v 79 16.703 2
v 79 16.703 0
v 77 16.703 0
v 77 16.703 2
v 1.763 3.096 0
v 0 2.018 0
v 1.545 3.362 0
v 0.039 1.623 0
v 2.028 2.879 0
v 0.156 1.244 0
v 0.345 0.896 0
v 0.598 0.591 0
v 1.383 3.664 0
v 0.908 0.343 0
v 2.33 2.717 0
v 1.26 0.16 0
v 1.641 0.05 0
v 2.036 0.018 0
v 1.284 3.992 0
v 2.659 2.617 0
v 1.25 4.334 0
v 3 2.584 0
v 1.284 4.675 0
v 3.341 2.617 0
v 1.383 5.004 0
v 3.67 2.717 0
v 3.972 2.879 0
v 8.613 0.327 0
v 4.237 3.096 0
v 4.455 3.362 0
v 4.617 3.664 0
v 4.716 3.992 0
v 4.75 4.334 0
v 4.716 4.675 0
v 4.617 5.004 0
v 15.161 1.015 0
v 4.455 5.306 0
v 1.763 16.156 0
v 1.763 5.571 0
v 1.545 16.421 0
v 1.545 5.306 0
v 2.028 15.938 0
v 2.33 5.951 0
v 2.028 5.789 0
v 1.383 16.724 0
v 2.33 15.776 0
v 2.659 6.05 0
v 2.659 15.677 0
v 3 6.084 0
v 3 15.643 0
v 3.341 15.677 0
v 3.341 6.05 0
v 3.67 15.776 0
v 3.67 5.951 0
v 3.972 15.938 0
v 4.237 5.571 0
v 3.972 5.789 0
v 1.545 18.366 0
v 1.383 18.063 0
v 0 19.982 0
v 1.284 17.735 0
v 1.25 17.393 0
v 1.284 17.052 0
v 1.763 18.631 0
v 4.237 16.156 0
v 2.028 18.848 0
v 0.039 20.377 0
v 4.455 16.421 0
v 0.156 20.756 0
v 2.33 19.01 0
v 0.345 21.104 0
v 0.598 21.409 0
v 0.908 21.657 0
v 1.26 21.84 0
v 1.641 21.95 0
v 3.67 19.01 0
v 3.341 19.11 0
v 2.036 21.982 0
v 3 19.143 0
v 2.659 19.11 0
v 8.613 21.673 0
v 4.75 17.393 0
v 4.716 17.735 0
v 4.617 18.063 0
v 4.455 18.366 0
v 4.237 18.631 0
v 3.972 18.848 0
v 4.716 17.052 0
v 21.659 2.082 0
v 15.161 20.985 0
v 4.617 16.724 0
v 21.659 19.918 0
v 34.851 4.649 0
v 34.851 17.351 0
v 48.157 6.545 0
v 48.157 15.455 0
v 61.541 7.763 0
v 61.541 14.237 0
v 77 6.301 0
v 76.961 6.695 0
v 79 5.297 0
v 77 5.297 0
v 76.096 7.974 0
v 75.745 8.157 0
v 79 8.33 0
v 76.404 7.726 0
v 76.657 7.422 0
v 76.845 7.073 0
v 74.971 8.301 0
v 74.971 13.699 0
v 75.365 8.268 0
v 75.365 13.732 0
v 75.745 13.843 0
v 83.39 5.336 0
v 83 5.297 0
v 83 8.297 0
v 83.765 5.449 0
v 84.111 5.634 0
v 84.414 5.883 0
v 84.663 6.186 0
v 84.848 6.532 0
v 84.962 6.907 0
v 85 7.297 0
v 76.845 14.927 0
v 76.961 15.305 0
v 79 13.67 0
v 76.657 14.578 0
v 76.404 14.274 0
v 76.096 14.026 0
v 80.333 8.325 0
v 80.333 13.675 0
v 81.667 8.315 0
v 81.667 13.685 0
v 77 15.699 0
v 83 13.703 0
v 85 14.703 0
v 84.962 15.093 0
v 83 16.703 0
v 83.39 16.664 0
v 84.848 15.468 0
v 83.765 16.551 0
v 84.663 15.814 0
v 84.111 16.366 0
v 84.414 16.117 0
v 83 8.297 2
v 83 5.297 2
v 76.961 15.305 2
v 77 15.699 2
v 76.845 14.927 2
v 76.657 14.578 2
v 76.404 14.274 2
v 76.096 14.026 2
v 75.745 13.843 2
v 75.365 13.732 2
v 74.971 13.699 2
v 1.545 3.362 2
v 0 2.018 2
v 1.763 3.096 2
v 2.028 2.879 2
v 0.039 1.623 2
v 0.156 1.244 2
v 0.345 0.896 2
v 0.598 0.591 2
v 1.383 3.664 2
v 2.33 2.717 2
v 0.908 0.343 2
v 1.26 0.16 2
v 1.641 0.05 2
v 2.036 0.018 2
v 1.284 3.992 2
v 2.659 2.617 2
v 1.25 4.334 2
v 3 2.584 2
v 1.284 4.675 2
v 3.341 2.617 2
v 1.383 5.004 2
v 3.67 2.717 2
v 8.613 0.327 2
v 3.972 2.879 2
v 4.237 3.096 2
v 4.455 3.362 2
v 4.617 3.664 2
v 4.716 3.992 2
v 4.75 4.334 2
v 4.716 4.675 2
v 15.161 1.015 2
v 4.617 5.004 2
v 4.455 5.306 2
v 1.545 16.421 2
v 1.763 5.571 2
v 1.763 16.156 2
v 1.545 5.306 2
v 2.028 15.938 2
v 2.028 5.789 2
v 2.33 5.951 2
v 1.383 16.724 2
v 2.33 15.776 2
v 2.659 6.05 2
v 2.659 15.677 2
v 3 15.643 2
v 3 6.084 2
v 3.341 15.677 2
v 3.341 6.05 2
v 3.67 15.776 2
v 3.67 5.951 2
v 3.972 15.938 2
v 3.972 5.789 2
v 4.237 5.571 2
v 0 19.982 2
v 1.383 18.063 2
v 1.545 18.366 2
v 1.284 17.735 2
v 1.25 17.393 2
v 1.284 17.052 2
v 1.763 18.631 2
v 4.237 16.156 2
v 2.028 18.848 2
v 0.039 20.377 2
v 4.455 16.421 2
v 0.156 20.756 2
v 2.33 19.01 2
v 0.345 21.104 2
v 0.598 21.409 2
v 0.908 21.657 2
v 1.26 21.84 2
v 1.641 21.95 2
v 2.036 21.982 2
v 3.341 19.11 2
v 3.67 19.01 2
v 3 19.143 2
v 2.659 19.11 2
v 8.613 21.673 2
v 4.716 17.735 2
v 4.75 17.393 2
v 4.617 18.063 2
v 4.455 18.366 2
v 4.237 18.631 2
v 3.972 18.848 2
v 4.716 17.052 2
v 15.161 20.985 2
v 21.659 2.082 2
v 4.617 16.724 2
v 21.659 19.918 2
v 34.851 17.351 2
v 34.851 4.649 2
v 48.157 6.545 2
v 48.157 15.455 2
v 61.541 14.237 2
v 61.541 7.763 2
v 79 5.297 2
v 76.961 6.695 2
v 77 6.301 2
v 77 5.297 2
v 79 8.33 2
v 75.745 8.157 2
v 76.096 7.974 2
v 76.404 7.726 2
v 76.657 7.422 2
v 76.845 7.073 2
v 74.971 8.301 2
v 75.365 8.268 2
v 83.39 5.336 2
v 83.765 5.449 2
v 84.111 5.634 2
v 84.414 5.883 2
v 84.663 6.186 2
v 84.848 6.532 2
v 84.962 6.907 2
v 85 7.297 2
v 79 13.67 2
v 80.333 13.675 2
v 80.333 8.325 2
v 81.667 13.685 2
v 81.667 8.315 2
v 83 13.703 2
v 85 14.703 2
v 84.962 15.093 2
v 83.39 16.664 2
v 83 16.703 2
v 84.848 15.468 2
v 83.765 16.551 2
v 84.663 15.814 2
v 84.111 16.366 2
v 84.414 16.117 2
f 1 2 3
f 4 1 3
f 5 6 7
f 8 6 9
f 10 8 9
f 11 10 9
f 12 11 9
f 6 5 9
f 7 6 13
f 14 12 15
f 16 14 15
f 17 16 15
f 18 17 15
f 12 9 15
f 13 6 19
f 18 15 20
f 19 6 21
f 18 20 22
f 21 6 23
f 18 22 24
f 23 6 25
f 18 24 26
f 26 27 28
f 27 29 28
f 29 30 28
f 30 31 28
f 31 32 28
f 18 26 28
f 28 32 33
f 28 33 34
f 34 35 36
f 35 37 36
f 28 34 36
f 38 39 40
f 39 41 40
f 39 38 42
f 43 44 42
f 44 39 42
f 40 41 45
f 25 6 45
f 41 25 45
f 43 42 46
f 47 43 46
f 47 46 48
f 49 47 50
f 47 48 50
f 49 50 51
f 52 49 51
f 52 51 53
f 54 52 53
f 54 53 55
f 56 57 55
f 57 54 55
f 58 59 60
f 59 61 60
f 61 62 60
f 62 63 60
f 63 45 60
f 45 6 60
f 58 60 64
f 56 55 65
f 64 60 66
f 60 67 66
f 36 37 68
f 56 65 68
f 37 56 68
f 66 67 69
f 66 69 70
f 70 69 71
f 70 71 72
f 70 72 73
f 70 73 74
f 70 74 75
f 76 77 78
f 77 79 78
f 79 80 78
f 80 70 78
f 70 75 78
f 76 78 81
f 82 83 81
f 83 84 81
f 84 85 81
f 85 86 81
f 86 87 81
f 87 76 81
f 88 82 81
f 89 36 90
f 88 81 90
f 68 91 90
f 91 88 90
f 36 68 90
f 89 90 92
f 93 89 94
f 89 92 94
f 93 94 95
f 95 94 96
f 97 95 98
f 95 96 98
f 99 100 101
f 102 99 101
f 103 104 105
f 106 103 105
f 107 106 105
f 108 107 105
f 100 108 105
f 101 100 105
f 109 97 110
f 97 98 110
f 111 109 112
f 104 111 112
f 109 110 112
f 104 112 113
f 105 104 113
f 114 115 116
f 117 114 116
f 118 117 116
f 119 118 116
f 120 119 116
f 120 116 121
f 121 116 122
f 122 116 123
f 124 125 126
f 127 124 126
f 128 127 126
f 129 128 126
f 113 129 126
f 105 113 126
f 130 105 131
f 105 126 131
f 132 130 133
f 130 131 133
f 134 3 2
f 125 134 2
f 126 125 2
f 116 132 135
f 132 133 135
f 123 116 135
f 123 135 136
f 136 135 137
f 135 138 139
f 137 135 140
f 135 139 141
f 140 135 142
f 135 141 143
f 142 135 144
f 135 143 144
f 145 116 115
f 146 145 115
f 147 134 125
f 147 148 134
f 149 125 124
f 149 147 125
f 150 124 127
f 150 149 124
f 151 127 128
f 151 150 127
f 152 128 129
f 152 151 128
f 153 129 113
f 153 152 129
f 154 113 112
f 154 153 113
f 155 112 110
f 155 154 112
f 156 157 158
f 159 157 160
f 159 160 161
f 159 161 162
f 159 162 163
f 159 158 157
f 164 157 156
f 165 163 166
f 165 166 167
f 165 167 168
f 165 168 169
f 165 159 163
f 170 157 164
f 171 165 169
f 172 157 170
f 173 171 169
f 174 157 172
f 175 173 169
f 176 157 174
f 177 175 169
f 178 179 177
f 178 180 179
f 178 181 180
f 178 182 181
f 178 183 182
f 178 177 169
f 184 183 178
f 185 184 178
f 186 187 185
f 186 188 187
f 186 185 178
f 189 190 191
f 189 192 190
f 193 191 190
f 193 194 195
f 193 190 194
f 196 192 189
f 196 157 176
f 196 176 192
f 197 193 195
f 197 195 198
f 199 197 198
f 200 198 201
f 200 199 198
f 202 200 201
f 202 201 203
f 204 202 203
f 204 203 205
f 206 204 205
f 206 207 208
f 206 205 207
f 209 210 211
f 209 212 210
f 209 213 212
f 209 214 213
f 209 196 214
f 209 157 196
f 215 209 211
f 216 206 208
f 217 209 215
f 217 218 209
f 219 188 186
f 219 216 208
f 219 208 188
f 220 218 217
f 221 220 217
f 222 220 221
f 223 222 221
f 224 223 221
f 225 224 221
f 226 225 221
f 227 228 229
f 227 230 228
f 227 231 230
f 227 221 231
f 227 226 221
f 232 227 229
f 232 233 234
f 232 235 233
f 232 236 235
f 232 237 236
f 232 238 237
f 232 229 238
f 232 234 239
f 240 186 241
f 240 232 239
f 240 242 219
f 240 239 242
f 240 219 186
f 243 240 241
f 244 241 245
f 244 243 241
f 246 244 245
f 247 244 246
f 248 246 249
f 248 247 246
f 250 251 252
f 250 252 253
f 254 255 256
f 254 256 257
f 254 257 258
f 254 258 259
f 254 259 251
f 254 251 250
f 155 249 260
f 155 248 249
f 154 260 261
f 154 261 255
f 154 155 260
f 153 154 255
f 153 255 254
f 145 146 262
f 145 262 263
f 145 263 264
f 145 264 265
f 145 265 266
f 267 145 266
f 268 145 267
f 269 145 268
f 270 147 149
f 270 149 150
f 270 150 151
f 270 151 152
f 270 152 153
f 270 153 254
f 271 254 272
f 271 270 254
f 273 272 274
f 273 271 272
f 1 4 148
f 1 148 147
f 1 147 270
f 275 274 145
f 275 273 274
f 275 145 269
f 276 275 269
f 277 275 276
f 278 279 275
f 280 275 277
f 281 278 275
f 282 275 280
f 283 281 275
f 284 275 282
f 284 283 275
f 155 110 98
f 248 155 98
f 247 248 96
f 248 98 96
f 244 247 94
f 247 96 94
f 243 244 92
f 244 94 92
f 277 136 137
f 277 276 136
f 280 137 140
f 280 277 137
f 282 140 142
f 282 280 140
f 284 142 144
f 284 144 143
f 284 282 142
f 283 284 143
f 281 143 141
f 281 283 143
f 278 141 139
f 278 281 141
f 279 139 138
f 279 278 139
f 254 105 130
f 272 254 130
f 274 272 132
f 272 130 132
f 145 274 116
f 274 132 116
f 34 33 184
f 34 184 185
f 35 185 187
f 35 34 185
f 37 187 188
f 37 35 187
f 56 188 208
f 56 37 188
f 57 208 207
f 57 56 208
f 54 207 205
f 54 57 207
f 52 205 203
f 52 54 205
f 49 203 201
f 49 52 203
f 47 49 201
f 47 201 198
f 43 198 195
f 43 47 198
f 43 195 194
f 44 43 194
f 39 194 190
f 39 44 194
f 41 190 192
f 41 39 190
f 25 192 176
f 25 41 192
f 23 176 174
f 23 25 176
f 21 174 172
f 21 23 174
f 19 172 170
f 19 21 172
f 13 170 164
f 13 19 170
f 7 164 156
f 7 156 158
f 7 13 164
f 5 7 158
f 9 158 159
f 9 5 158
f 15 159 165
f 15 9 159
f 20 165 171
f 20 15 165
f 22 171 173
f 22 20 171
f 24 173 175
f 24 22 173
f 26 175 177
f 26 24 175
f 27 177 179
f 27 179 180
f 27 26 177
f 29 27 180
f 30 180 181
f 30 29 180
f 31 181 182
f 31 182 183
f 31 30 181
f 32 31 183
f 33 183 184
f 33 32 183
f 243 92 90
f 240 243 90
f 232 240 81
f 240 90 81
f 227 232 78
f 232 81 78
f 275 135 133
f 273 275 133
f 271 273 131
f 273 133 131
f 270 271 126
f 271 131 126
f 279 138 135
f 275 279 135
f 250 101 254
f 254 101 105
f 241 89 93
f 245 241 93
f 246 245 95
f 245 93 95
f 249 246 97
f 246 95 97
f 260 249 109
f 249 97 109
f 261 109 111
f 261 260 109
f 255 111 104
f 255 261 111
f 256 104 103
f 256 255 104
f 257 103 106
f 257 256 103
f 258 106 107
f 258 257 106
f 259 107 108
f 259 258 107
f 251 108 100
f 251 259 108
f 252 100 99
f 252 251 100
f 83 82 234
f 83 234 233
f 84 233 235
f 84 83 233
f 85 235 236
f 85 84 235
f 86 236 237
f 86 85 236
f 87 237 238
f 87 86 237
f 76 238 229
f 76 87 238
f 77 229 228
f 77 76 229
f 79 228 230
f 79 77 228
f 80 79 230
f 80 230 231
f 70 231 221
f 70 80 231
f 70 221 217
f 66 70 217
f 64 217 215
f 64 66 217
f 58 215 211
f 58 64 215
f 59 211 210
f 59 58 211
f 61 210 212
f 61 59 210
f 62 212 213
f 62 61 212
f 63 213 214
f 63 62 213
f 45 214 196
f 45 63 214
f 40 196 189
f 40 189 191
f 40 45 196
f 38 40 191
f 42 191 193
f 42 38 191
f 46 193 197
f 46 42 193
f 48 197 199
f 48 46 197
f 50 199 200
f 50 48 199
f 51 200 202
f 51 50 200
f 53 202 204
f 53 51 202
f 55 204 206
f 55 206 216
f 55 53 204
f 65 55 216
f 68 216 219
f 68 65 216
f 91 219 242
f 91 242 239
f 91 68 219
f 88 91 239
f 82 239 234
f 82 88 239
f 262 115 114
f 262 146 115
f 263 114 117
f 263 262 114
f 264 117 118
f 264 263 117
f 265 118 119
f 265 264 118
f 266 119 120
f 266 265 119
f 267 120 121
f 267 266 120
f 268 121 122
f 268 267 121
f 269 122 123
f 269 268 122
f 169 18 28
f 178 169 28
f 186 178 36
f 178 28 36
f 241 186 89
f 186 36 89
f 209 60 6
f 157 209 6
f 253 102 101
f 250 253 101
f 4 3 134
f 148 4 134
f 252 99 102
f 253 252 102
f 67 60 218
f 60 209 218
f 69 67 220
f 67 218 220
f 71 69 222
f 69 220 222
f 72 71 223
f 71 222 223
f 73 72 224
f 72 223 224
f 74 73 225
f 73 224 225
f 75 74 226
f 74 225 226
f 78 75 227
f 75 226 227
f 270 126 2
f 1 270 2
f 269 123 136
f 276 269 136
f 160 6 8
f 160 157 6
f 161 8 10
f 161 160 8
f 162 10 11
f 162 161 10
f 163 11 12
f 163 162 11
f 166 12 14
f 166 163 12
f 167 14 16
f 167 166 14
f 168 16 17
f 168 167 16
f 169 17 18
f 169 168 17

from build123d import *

# Parameters (mm, degrees)
F0_R     = 1.75
F1_DEPTH = 2
F2_R     = 1.99999


# Not quite as in the source:
# - a fillet or chamfer is up to 0.001 mm smaller than in the source, because OpenCascade refuses the exact size


with BuildPart() as f1:
    # F0 (on Top) → F1 (new body)
    with BuildSketch(Plane.XY):
        with BuildLine():
            Line((0, 22), (0, 0))
            ThreePointArc((0, 0), (10.8792490031, 0.5215994991), (21.6586962342, 2.0816130564))
            ThreePointArc((21.6586962342, 2.0816130564), (49.1649189112, 6.6602813892), (77, 8.3230352611))
            ThreePointArc((77, 8.3230352611), (77.9999938672, 8.3281723489), (79, 8.3295355292))
            ThreePointArc((79, 8.3295355292), (81.0000609284, 8.3209395881), (83, 8.2972474438))
            ThreePointArc((83, 8.2972474438), (84.0000366078, 8.2797378058), (85, 8.2584535703))
            Line((85, 8.2584535703), (85, 13.7415464297))
            ThreePointArc((85, 13.7415464297), (84.0000366078, 13.7202621942), (83, 13.7027525562))
            ThreePointArc((83, 13.7027525562), (81.0000609284, 13.6790604119), (79, 13.6704644708))
            ThreePointArc((79, 13.6704644708), (77.9999938672, 13.6718276511), (77, 13.6769647389))
            ThreePointArc((77, 13.6769647389), (49.1649189112, 15.3397186108), (21.6586962342, 19.9183869436))
            ThreePointArc((21.6586962342, 19.9183869436), (10.8792490031, 21.4784005009), (0, 22))
        make_face()
        with Locations((3, 4.3338485993)):
            Circle(F0_R, mode=Mode.SUBTRACT)
        with Locations((3, 17.3932574689)):
            Circle(F0_R, mode=Mode.SUBTRACT)
        with BuildLine():
            ThreePointArc((79, 8.3295355292), (77.9999938672, 8.3281723489), (77, 8.3230352611))
            Line((77, 8.3230352611), (77, 5.2972474438))
            Line((77, 5.2972474438), (79, 5.2972474438))
            Line((79, 5.2972474438), (79, 8.3295355292))
        make_face()
        with BuildLine():
            Line((83, 5.2972474438), (85, 5.2972474438))
            Line((85, 5.2972474438), (85, 8.2584535703))
            ThreePointArc((85, 8.2584535703), (84.0000366078, 8.2797378058), (83, 8.2972474438))
            Line((83, 8.2972474438), (83, 5.2972474438))
        make_face()
        with BuildLine():
            Line((77, 16.7027525562), (77, 13.6769647389))
            ThreePointArc((77, 13.6769647389), (77.9999938672, 13.6718276511), (79, 13.6704644708))
            Line((79, 13.6704644708), (79, 16.7027525562))
            Line((79, 16.7027525562), (77, 16.7027525562))
        make_face()
        with BuildLine():
            Line((85, 13.7415464297), (85, 16.7027525562))
            Line((85, 16.7027525562), (83, 16.7027525562))
            Line((83, 16.7027525562), (83, 13.7027525562))
            ThreePointArc((83, 13.7027525562), (84.0000366078, 13.7202621942), (85, 13.7415464297))
        make_face()
    extrude(amount=F1_DEPTH)

    # F2 (radius 2 in the source; OpenCascade refuses exactly that, so slightly less here)
    f2_edges = [f1.edges().sort_by_distance(p)[0] for p in [
        (0, 0, 1),
        (0, 22, 1),
        (85, 5.297247, 1),
        (85, 16.702753, 1),
        (77, 8.323035, 1),
        (77, 13.676965, 1),
    ]]
    fillet(f2_edges, radius=F2_R)


solid = f1.part
